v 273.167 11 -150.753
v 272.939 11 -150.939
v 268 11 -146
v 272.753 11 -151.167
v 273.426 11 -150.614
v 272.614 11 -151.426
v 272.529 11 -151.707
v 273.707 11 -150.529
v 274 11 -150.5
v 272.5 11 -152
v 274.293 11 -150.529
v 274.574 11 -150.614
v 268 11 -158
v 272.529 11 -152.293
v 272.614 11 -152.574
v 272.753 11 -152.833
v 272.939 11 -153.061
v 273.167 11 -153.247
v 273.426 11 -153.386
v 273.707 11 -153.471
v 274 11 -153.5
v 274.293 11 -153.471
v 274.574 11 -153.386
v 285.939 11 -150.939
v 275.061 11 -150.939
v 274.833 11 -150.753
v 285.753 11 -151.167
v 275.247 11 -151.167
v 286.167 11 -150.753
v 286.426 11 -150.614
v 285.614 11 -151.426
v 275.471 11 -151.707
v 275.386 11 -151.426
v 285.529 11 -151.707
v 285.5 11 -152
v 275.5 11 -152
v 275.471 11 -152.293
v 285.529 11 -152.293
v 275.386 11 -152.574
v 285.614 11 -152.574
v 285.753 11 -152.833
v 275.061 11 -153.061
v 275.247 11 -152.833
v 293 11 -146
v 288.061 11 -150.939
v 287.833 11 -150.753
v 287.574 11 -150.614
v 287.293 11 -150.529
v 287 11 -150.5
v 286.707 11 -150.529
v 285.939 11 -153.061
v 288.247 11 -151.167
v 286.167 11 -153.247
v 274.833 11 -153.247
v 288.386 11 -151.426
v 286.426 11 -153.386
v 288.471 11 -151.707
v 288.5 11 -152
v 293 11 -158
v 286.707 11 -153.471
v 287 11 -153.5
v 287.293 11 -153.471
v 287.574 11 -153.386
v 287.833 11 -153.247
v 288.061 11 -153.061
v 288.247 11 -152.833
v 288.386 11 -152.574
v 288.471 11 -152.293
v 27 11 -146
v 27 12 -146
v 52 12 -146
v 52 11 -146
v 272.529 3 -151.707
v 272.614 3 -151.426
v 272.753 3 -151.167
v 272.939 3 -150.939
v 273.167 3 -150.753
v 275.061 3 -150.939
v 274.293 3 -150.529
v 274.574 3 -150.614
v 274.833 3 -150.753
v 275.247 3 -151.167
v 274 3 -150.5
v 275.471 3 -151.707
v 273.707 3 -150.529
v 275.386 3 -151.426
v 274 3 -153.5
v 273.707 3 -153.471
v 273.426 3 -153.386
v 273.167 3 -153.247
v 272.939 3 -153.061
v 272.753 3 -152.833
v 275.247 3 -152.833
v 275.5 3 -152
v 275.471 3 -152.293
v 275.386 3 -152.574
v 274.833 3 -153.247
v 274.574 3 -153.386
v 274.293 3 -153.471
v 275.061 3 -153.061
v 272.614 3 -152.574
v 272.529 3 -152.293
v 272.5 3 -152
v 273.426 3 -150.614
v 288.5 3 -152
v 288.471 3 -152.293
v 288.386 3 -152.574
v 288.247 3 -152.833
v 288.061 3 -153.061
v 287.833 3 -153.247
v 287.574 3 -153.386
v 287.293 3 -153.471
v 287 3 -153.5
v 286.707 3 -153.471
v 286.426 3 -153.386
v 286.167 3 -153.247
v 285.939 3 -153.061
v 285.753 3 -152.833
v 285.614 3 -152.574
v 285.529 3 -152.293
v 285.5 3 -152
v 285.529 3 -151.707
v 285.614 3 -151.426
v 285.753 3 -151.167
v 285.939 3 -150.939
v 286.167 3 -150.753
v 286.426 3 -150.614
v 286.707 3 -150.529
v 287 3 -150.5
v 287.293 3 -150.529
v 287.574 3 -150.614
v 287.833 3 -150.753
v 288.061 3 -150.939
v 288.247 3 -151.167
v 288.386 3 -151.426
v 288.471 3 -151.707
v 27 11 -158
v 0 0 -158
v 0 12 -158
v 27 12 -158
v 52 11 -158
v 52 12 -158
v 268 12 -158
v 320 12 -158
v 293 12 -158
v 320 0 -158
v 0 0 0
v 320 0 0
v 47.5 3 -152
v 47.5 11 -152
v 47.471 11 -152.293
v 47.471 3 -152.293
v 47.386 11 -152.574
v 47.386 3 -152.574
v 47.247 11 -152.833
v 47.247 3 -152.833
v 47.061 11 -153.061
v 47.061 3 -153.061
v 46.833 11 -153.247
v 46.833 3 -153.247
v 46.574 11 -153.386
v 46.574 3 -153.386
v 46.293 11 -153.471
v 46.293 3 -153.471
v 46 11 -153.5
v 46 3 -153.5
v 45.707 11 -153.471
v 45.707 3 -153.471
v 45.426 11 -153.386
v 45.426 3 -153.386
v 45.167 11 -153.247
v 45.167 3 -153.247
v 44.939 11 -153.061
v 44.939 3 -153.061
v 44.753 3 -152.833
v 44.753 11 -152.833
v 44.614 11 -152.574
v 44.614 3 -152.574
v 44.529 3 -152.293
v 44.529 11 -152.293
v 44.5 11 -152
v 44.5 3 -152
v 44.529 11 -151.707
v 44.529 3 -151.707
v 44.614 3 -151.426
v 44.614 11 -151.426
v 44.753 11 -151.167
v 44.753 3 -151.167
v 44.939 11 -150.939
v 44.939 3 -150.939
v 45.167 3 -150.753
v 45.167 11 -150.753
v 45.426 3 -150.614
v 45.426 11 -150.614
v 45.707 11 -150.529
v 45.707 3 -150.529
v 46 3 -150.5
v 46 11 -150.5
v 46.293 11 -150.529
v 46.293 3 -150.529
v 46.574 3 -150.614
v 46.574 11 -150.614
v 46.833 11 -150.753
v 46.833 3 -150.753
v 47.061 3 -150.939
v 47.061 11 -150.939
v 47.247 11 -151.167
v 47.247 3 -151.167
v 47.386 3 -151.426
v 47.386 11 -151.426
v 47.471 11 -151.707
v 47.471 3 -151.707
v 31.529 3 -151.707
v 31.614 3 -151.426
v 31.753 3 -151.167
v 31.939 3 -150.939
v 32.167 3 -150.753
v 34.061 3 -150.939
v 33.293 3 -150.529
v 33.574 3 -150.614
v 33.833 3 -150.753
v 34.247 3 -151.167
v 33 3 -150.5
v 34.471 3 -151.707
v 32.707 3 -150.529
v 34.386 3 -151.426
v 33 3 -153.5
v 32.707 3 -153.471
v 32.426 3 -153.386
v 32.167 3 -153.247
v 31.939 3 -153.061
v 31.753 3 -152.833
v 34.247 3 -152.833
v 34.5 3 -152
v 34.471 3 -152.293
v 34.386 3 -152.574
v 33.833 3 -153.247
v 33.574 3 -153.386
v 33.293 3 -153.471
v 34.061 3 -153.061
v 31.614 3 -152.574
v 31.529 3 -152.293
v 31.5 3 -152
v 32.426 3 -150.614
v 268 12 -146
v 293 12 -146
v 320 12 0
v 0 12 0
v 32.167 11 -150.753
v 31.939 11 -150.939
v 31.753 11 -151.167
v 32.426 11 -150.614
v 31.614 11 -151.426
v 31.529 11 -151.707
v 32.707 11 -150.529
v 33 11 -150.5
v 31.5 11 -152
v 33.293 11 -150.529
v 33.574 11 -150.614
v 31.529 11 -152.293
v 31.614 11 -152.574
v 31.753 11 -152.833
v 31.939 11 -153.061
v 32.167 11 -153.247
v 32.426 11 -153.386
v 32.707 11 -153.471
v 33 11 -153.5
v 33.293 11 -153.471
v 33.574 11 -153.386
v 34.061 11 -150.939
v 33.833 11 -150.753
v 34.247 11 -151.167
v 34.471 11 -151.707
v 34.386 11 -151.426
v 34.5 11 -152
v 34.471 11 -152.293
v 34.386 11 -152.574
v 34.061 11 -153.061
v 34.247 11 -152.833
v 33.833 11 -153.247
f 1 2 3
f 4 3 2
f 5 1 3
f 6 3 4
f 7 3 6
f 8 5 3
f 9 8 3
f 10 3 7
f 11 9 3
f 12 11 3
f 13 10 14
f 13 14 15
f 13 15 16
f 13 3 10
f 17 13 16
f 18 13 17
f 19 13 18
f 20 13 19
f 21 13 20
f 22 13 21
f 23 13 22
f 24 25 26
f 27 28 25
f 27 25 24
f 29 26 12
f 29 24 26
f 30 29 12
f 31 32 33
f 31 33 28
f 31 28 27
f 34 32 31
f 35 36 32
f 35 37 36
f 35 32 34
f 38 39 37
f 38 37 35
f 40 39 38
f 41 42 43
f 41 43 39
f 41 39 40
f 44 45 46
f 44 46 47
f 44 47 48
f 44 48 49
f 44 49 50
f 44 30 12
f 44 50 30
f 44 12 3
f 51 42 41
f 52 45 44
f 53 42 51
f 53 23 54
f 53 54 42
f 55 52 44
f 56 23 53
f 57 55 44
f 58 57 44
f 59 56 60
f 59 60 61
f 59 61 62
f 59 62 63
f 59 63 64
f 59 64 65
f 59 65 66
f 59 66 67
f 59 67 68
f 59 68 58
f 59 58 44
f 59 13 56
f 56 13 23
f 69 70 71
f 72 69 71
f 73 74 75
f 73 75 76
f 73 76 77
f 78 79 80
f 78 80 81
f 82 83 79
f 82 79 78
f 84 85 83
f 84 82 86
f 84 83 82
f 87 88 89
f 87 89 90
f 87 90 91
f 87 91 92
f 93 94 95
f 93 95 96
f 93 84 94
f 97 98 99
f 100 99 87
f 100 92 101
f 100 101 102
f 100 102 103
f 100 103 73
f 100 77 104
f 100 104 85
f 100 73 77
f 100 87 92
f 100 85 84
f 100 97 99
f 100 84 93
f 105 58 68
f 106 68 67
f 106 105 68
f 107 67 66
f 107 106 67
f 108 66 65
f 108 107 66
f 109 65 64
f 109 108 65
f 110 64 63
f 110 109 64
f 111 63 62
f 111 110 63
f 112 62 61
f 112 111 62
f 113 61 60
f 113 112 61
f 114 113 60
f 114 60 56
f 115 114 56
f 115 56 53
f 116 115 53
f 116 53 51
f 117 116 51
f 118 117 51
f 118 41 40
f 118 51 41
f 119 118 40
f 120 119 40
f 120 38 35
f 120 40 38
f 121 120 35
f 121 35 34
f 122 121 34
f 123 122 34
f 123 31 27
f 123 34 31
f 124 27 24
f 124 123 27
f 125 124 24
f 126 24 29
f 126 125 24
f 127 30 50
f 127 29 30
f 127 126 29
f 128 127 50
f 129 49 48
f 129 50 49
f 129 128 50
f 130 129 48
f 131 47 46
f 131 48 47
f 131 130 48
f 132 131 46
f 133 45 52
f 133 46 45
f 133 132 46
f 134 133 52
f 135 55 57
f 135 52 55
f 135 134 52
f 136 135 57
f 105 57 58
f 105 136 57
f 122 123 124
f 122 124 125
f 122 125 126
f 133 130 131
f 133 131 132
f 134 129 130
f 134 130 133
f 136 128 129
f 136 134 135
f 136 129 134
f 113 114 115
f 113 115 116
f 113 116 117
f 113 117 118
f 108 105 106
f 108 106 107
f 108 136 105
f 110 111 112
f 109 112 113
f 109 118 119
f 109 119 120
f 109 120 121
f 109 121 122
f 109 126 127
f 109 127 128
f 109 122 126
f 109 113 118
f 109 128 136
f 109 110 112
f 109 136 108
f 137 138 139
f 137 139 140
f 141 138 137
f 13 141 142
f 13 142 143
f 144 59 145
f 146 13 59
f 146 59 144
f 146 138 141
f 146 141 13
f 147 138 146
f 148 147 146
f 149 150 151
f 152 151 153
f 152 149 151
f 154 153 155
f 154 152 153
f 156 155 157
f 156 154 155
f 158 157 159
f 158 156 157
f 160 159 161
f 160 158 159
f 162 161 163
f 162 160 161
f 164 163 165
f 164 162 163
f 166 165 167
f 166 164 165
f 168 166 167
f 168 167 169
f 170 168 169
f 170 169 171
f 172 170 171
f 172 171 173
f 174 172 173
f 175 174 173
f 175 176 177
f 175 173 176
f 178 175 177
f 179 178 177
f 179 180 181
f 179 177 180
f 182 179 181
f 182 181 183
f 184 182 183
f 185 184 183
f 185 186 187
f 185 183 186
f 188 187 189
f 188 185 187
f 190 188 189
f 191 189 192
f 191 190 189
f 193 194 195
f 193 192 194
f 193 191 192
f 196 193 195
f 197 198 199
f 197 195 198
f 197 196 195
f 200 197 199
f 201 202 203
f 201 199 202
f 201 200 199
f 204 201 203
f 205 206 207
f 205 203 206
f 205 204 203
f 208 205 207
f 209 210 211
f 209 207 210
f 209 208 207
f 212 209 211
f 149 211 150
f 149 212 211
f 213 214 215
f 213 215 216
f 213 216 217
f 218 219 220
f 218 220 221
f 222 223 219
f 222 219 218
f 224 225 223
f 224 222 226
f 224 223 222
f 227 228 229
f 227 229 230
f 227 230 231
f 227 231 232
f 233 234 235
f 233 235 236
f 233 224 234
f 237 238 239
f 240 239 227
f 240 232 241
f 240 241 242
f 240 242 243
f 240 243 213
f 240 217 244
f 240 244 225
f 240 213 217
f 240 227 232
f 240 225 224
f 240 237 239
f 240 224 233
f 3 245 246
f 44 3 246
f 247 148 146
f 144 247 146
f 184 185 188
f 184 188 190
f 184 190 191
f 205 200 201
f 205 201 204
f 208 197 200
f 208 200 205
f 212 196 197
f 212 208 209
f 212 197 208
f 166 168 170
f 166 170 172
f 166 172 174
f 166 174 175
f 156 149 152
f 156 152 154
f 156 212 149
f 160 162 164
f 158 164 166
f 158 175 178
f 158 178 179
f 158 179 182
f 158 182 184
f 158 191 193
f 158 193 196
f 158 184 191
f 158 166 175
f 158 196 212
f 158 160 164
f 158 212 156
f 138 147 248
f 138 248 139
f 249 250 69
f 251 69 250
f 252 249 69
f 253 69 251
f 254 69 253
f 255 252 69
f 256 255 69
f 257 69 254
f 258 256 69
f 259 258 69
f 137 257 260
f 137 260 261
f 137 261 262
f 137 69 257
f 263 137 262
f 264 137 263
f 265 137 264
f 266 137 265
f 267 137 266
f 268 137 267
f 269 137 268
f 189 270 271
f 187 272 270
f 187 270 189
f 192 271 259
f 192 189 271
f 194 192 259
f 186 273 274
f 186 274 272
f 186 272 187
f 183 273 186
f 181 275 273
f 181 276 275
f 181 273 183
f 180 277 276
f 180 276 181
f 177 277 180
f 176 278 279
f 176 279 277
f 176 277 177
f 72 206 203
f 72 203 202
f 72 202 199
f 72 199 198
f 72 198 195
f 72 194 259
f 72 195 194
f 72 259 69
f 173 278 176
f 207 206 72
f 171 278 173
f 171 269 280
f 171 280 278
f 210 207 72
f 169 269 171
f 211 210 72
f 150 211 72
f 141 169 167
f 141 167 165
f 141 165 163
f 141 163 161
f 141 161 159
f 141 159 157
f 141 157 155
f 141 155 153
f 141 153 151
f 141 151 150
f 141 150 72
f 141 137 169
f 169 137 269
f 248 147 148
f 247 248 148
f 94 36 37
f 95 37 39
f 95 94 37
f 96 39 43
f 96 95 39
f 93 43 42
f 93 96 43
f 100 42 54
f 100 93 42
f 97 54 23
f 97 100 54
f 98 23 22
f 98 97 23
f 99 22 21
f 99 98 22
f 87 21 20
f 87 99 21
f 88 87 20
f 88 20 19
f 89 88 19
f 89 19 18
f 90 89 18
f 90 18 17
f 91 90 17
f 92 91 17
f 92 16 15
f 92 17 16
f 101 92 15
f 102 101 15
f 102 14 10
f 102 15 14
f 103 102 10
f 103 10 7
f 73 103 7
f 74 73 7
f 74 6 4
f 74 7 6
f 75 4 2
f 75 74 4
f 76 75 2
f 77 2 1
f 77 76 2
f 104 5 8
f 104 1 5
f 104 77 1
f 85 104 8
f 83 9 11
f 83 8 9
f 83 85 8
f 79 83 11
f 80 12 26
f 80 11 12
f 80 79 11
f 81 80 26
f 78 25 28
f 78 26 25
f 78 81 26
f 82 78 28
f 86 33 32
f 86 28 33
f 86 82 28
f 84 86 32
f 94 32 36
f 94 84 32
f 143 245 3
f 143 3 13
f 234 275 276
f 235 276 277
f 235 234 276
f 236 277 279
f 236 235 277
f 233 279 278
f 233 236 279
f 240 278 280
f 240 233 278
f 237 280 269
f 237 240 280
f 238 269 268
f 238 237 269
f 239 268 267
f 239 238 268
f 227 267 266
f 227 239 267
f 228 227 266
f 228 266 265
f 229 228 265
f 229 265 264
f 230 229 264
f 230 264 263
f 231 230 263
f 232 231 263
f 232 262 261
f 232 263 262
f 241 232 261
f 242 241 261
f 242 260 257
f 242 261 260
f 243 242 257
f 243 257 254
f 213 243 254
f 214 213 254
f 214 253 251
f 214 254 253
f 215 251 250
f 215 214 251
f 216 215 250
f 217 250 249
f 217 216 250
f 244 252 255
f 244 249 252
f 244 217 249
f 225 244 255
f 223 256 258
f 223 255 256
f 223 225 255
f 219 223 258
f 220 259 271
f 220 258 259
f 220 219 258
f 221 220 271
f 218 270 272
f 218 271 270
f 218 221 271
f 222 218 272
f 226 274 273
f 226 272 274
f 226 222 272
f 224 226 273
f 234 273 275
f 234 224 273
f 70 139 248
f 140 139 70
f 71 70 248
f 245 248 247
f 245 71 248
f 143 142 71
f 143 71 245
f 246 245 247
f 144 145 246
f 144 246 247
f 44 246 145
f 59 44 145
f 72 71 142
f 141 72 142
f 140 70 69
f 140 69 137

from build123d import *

# Parameters (mm, degrees)
SKETCH1_W           = 320
SKETCH1_H           = 158
BOSS_EXTRUDE1_DEPTH = 12
CUT_EXTRUDE1_START  = 12
SKETCH2_W           = 25
SKETCH2_H           = 12
CUT_EXTRUDE1_DEPTH  = 1
CUT_EXTRUDE5_START  = 3
SKETCH3_R           = 1.5
CUT_EXTRUDE5_DEPTH  = 9


with BuildPart() as part:
    # Sketch1 → Boss-Extrude1 (new body)
    with BuildSketch(Plane(origin=(0, 0, 0), x_dir=(1, 0, 0), z_dir=(0, 1, 0))):
        with Locations((160, 79)):
            Rectangle(SKETCH1_W, SKETCH1_H)
    extrude(amount=BOSS_EXTRUDE1_DEPTH)

    # Sketch2 → Cut-Extrude1 (cut)
    with BuildSketch(Plane(origin=(0, 0, 0), x_dir=(1, 0, 0), z_dir=(0, 1, 0)).offset(CUT_EXTRUDE1_START)):
        with Locations((39.5, 152)):
            Rectangle(SKETCH2_W, SKETCH2_H)
        with Locations((280.5, 152)):
            Rectangle(SKETCH2_W, SKETCH2_H)
    extrude(amount=-CUT_EXTRUDE1_DEPTH, mode=Mode.SUBTRACT)

    # Sketch3 → Cut-Extrude5 (cut)
    with BuildSketch(Plane(origin=(0, 0, 0), x_dir=(1, 0, 0), z_dir=(0, 1, 0)).offset(CUT_EXTRUDE5_START)):
        with Locations((33, 152)):
            Circle(SKETCH3_R)
        with Locations((46, 152)):
            Circle(SKETCH3_R)
        with Locations((274, 152)):
            Circle(SKETCH3_R)
        with Locations((287, 152)):
            Circle(SKETCH3_R)
    extrude(amount=CUT_EXTRUDE5_DEPTH, mode=Mode.SUBTRACT)


solid = part.part
